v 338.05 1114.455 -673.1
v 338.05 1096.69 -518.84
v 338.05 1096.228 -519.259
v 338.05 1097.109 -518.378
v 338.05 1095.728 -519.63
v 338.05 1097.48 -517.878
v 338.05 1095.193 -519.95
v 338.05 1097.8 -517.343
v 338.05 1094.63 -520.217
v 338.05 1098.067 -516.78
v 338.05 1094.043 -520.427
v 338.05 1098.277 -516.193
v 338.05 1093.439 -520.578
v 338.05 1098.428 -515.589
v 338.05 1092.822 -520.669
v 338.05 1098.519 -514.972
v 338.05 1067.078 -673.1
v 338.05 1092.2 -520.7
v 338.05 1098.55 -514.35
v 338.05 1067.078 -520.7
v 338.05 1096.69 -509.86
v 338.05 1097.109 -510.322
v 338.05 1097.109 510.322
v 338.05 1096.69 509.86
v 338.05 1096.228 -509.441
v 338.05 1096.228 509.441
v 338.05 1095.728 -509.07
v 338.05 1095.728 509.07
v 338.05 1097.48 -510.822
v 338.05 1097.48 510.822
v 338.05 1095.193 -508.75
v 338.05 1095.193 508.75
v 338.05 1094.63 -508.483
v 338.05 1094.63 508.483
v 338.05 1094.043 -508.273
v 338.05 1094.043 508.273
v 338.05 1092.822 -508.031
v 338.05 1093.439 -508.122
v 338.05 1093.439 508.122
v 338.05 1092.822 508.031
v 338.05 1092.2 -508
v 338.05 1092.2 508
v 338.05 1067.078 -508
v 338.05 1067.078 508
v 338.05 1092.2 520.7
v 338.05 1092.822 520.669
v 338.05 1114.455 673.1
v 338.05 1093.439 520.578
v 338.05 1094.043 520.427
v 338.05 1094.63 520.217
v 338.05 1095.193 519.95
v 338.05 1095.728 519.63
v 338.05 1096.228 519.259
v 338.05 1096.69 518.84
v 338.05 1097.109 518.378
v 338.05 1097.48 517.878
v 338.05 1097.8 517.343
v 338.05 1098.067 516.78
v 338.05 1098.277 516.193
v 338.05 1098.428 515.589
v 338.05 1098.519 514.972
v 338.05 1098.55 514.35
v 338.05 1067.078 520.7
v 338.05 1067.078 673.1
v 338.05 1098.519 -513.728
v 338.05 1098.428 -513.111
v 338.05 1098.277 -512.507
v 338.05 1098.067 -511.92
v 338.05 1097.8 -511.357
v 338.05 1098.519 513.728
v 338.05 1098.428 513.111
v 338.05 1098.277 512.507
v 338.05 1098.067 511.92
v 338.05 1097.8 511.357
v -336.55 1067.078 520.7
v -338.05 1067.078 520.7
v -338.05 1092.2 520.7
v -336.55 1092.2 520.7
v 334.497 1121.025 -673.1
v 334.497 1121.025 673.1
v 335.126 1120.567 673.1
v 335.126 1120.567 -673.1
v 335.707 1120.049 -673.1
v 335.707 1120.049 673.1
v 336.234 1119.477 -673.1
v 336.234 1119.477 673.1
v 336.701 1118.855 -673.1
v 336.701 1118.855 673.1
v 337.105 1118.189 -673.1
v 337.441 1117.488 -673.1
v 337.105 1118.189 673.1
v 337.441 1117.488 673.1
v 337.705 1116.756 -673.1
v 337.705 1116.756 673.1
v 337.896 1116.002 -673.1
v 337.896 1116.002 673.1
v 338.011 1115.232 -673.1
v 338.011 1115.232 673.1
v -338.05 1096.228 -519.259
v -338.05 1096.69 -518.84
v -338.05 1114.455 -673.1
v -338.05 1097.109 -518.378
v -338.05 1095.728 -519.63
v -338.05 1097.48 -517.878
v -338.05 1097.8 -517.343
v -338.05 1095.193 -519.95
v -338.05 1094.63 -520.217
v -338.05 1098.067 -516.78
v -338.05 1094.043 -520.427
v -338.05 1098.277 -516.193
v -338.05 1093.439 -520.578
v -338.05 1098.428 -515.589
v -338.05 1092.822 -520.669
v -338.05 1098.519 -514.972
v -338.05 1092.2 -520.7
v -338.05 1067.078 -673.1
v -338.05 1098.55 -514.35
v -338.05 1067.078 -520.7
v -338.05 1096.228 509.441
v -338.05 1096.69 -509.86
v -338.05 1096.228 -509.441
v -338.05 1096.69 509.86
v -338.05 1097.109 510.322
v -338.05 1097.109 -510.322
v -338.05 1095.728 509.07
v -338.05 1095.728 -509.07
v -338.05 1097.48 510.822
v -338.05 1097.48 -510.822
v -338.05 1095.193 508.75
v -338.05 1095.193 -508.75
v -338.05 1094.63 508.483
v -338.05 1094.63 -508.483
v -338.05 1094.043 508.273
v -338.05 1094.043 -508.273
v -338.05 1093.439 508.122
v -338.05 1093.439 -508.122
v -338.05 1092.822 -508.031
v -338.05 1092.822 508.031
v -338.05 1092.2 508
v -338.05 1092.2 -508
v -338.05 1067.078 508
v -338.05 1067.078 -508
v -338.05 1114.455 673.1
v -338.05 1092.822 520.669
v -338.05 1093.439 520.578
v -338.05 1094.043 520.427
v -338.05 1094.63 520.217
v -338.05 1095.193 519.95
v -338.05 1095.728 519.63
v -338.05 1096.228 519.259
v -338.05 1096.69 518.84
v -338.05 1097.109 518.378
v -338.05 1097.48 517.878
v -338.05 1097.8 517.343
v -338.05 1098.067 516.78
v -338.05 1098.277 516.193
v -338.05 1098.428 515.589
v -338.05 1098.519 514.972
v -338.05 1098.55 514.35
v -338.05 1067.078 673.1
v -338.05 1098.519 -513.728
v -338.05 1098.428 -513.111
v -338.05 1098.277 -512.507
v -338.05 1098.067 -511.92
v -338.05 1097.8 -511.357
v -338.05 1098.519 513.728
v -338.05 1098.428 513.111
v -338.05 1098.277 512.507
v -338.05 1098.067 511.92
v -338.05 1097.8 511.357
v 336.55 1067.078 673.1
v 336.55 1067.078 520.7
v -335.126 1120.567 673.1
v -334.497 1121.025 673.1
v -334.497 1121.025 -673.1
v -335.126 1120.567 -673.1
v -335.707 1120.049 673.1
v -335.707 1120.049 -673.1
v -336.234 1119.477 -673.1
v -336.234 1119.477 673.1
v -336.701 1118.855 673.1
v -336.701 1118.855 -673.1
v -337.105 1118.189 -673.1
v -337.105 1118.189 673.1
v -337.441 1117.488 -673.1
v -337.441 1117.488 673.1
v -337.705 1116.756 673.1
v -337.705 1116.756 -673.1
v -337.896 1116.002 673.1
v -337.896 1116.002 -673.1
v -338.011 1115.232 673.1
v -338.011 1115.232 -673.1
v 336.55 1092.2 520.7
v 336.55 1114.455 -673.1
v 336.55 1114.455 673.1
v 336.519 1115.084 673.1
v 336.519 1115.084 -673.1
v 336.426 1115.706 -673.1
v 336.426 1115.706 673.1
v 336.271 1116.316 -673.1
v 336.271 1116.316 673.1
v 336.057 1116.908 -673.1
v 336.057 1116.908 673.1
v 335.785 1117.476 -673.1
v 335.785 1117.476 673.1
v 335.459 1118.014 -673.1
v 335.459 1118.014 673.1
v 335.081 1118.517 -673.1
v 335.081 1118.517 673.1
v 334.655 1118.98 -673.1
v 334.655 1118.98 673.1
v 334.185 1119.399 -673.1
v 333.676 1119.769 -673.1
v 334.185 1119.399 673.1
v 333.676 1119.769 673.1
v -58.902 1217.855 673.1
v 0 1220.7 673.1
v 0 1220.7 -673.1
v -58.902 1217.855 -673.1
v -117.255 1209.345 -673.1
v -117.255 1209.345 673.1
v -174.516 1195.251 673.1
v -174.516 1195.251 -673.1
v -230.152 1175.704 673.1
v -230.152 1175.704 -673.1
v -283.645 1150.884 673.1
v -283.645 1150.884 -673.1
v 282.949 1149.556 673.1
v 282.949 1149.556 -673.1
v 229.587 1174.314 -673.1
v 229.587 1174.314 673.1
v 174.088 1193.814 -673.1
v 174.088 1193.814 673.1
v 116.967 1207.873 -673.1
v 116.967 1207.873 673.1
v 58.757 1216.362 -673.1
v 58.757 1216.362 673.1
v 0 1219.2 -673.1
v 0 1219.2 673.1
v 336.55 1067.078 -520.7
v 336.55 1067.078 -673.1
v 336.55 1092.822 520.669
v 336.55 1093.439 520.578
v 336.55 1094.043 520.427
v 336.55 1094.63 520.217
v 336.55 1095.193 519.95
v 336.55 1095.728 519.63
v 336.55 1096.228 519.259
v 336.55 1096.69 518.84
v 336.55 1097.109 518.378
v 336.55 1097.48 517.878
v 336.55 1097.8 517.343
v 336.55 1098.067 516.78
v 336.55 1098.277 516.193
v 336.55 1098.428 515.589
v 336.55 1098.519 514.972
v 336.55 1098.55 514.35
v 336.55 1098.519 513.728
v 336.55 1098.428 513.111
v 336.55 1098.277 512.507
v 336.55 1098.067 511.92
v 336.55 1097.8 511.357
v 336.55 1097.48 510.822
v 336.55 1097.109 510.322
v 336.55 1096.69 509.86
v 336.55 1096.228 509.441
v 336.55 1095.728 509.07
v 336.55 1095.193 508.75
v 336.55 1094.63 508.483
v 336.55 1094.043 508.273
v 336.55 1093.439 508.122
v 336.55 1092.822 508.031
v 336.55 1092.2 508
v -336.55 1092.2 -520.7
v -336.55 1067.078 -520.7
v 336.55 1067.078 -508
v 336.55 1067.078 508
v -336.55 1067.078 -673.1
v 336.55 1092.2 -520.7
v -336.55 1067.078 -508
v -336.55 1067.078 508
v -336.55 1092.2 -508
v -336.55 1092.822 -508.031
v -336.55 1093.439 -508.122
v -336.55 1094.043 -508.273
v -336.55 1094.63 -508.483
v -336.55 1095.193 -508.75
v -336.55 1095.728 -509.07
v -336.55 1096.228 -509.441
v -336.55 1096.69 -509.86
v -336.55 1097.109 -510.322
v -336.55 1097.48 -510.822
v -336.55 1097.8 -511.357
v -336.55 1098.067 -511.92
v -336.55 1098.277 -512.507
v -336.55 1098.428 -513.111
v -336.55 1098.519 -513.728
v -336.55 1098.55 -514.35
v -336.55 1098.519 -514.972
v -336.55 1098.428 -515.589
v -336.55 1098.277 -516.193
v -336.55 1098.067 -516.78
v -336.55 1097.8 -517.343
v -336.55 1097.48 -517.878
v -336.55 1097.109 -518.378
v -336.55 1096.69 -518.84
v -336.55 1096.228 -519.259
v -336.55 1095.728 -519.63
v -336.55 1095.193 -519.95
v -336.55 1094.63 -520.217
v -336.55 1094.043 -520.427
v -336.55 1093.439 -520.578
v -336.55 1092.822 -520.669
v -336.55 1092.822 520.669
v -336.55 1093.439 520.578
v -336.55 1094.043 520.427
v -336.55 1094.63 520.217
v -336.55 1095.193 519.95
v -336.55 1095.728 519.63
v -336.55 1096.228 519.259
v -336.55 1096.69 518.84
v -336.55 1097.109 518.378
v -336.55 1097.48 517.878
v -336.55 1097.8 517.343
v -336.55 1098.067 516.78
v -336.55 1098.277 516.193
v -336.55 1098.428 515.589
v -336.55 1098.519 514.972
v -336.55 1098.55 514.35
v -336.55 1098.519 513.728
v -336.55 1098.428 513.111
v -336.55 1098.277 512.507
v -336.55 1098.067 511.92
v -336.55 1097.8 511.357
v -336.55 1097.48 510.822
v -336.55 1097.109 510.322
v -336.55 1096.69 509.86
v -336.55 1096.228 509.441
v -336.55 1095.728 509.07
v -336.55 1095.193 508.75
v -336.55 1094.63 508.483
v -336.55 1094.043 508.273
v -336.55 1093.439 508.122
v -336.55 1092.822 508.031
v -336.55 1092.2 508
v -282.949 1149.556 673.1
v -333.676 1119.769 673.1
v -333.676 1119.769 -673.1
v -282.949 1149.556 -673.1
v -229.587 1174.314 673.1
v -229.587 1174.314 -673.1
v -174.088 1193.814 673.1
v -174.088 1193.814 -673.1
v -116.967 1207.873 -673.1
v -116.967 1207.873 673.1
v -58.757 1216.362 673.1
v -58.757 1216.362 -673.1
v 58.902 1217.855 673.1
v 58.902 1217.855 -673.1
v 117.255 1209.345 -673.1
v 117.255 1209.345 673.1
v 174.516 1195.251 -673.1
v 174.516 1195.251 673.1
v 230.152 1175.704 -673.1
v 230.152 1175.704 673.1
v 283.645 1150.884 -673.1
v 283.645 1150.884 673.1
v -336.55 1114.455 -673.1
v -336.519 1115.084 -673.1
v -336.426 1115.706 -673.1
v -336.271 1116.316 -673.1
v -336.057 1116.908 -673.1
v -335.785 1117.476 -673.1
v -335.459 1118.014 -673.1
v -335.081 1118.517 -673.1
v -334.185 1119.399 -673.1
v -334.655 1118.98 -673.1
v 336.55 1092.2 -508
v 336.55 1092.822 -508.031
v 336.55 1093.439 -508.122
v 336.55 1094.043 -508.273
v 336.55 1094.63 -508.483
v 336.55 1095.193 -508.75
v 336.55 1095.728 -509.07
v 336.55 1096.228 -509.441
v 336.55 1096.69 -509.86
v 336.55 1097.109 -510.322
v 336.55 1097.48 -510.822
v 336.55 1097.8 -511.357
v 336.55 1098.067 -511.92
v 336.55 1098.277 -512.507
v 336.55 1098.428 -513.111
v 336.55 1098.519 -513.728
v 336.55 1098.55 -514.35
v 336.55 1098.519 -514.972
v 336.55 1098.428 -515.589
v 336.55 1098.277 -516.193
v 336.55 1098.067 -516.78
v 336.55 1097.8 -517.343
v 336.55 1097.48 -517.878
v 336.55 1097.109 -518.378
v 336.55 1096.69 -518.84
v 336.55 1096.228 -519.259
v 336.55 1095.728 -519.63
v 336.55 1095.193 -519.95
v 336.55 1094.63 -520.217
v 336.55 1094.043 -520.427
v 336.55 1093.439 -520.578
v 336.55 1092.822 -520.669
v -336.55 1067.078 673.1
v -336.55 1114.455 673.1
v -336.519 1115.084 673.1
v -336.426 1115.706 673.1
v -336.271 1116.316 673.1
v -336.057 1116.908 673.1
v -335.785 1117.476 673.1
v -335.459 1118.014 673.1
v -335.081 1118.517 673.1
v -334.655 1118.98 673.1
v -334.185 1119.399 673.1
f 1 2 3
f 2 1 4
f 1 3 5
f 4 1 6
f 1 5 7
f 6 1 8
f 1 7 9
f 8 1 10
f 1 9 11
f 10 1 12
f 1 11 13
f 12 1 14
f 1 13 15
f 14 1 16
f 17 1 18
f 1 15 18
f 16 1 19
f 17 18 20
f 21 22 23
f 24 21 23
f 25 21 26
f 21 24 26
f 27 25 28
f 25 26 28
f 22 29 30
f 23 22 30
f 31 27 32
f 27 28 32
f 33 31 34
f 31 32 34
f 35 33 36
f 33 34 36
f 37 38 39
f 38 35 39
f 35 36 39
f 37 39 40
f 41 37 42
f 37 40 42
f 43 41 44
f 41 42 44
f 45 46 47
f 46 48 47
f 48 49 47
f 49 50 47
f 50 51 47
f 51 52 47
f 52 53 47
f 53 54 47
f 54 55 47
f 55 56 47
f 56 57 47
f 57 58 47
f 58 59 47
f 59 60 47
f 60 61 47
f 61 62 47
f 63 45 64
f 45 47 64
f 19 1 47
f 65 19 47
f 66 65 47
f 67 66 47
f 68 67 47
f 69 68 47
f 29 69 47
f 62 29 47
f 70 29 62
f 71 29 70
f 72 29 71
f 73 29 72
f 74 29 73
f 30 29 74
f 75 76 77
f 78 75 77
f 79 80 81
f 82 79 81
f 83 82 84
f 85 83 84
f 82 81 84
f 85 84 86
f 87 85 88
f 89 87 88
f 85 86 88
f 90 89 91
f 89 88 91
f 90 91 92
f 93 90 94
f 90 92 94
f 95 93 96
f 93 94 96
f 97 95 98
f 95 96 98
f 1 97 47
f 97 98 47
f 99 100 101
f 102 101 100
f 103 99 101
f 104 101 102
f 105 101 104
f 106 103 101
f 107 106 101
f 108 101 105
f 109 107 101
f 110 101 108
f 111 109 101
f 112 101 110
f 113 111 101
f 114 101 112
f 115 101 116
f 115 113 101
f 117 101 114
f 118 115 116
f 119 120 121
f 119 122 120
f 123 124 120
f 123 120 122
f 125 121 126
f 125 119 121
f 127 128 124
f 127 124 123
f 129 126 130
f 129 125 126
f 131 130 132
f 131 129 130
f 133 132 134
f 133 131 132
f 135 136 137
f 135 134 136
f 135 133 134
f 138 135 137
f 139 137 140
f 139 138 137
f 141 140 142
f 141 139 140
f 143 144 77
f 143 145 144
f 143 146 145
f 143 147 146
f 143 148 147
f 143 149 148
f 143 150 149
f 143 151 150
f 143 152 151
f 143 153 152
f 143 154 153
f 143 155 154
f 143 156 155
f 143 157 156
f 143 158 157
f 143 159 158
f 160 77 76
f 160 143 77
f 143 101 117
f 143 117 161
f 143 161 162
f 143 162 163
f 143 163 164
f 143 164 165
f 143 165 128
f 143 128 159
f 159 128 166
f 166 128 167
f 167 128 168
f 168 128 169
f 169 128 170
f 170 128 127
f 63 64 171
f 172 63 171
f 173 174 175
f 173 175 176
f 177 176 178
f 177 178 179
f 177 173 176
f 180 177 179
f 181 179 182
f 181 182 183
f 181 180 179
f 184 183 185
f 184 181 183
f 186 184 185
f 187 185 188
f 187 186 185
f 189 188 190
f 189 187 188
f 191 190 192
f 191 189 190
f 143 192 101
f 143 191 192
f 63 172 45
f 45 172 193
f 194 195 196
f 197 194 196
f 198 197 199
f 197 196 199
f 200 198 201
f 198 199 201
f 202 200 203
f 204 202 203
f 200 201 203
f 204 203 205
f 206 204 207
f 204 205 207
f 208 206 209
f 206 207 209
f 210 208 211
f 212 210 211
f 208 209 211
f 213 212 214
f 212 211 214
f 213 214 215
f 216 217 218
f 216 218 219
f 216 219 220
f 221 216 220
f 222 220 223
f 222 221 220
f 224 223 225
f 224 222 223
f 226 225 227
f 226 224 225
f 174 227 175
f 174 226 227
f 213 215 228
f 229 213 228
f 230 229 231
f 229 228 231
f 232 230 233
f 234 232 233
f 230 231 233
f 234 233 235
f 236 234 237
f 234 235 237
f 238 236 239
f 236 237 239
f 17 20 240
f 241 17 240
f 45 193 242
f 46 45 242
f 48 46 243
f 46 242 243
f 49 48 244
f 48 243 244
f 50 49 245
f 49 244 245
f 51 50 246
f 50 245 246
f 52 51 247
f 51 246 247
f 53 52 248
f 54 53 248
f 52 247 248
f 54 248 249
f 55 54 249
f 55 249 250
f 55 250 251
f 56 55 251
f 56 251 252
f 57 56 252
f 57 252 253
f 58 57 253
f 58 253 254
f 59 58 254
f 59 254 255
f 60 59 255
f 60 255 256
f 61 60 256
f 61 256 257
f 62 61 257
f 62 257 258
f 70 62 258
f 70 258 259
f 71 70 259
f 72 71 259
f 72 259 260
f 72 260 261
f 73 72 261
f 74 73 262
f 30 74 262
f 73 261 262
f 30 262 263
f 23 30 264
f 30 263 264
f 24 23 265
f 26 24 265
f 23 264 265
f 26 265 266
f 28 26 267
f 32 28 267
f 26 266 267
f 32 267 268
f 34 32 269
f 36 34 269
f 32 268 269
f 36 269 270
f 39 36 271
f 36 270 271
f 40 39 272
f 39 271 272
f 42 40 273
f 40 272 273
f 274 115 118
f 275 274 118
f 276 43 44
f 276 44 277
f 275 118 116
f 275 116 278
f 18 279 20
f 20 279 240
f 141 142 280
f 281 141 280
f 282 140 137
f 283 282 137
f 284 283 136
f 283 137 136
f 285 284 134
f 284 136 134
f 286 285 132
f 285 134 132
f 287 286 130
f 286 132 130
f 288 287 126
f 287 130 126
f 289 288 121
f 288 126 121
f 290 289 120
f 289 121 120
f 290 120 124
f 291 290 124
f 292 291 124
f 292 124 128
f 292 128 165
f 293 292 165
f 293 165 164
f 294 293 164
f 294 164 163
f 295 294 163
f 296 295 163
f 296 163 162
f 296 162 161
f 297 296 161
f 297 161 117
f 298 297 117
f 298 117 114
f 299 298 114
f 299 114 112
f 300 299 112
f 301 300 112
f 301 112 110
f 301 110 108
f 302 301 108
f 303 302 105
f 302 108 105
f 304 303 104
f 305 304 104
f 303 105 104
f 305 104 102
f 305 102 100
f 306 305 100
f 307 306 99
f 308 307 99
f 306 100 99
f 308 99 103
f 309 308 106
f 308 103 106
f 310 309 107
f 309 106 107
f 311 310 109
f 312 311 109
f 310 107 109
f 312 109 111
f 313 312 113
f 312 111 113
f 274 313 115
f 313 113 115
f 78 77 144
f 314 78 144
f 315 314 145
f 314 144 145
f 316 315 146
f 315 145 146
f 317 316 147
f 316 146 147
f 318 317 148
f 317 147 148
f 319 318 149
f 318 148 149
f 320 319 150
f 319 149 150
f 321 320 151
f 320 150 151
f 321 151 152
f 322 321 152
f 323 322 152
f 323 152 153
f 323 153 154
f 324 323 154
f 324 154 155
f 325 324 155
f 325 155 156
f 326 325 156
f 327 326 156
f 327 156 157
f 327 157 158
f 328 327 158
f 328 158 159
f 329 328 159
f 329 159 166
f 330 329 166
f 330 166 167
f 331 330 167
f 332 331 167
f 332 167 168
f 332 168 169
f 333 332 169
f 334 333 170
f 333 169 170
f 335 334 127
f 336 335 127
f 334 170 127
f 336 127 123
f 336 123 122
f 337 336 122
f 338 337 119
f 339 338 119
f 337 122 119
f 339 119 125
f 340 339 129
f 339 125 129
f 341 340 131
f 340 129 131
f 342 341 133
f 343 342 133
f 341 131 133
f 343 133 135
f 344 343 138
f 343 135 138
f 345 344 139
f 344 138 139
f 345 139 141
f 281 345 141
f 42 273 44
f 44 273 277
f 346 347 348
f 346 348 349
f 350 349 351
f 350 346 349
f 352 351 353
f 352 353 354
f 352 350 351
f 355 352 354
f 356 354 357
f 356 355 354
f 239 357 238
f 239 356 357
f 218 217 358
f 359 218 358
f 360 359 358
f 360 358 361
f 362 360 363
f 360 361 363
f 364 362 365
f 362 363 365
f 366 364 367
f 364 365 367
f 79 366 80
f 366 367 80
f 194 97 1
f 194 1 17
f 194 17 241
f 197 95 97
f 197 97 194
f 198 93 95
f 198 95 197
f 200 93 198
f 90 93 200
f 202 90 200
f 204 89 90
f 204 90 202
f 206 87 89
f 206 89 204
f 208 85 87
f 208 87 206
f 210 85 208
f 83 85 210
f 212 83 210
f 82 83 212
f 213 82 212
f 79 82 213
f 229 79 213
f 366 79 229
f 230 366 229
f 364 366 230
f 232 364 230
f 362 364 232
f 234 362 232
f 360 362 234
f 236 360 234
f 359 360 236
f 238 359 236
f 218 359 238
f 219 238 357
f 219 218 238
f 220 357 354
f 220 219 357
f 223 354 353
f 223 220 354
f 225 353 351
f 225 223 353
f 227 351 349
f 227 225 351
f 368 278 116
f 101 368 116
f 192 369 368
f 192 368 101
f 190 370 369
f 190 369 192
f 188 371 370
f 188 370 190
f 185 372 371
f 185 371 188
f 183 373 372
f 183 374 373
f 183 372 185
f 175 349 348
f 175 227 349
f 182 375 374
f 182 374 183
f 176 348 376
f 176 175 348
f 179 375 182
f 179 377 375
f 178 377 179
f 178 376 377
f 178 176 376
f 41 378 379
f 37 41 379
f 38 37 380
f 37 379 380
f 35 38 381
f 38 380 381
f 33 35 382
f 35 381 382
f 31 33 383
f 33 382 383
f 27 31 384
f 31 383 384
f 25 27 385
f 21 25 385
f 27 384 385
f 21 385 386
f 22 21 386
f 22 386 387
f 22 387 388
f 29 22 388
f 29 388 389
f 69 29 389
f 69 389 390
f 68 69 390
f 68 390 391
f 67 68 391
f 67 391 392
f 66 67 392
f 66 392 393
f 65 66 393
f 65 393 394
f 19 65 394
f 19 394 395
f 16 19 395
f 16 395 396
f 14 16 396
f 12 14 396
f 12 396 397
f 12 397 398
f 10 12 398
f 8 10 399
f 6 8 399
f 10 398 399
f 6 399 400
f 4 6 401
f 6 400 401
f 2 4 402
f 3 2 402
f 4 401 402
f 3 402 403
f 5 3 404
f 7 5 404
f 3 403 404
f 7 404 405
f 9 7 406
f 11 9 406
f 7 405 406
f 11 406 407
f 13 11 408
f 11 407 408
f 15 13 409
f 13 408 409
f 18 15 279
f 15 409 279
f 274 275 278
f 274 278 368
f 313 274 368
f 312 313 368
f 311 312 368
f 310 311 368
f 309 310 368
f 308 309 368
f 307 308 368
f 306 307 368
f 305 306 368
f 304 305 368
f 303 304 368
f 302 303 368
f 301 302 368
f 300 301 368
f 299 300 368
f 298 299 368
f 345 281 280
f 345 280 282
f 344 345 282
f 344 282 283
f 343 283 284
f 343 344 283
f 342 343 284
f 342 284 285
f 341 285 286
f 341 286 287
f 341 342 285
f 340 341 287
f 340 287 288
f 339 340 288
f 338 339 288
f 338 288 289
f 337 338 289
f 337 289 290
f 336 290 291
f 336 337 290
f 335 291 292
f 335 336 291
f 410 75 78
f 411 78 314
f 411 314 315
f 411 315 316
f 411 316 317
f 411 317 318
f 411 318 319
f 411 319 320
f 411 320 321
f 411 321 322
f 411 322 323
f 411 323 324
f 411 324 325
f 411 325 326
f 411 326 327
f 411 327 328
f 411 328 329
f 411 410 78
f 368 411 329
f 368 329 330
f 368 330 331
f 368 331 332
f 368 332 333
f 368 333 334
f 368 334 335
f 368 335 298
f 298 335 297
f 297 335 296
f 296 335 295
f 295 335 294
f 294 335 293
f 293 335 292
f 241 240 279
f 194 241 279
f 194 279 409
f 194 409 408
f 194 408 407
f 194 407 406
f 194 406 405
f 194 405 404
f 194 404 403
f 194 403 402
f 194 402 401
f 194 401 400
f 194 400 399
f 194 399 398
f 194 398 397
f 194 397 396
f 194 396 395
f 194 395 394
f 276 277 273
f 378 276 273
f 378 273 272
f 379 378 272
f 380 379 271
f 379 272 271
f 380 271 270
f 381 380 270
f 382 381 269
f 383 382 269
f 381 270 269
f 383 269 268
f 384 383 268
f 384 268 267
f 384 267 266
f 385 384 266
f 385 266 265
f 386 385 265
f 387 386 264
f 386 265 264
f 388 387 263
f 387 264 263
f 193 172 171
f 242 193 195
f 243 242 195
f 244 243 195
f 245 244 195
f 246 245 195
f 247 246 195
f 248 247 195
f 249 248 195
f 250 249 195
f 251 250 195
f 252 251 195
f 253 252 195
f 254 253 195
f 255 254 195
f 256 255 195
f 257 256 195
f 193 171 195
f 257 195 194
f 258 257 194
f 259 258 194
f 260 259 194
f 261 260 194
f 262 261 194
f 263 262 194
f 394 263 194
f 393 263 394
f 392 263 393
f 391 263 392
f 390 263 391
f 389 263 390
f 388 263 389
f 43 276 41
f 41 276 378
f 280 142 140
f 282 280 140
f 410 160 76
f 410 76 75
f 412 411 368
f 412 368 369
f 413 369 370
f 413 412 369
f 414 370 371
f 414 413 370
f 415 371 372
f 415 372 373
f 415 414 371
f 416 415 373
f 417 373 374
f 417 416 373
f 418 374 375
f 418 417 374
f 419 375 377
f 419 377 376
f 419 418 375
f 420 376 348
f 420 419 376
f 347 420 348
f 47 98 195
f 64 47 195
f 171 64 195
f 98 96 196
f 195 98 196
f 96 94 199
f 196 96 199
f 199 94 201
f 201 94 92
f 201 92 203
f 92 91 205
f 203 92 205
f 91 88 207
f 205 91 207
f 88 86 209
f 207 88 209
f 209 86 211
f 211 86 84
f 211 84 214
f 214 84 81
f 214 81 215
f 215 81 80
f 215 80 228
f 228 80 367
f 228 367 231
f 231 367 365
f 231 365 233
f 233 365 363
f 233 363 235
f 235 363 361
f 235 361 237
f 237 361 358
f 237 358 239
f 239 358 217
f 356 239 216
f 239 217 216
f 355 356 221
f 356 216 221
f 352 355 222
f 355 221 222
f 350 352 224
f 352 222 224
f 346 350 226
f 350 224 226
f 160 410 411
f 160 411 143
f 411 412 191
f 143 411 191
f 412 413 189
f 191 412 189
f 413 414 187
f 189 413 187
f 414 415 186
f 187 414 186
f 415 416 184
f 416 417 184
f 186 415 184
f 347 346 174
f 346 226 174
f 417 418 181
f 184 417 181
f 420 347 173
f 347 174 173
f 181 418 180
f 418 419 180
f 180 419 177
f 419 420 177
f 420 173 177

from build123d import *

# Parameters (mm, degrees)
EXTRUDE_THIN1_DEPTH = 673.1
CUT_EXTRUDE2_DEPTH  = 677.1


with BuildPart() as part:
    # Sketch1 → Extrude-Thin1 (new body, symmetric)
    with BuildSketch(Plane.XY):
        with BuildLine():
            Line((-336.55, 1067.077736577), (-336.55, 1114.454951942))
            ThreePointArc((-336.55, 1114.454951942), (-335.785416867, 1117.475815795), (-333.675789474, 1119.769214594))
            ThreePointArc((-333.675789474, 1119.769214594), (-174.087631358, 1193.813707994), (0, 1219.2))
            Line((0, 1219.2), (0, 1220.7))
            ThreePointArc((0, 1220.7), (-174.515996593, 1195.251241724), (-334.496842105, 1121.024552228))
            ThreePointArc((-334.496842105, 1121.024552228), (-337.104806678, 1118.189405682), (-338.05, 1114.454951942))
            Line((-338.05, 1114.454951942), (-338.05, 1067.077736577))
            Line((-338.05, 1067.077736577), (-336.55, 1067.077736577))
        make_face()
    extrude_thin1 = extrude(amount=EXTRUDE_THIN1_DEPTH, both=True)

    # Mirror1: Extrude-Thin1 across plane
    add(extrude_thin1.mirror(Plane(origin=(0, 0, 0), x_dir=(0, 0, 1), z_dir=(1, 0, 0))))

    # Sketch3 → Cut-Extrude2 (cut, through all)
    with BuildSketch(Plane.ZY.offset(338.05)):
        with BuildLine():
            Line((508, 1092.2), (508, 1067.077736577))
            Line((508, 1067.077736577), (520.7, 1067.077736577))
            Line((520.7, 1067.077736577), (520.7, 1092.2))
            ThreePointArc((520.7, 1092.2), (514.35, 1098.55), (508, 1092.2))
        make_face()
        with BuildLine():
            Line((-520.7, 1067.077736577), (-508, 1067.077736577))
            Line((-508, 1067.077736577), (-508, 1092.2))
            ThreePointArc((-508, 1092.2), (-514.35, 1098.55), (-520.7, 1092.2))
            Line((-520.7, 1092.2), (-520.7, 1067.077736577))
        make_face()
    extrude(amount=-CUT_EXTRUDE2_DEPTH, mode=Mode.SUBTRACT)


solid = part.part
